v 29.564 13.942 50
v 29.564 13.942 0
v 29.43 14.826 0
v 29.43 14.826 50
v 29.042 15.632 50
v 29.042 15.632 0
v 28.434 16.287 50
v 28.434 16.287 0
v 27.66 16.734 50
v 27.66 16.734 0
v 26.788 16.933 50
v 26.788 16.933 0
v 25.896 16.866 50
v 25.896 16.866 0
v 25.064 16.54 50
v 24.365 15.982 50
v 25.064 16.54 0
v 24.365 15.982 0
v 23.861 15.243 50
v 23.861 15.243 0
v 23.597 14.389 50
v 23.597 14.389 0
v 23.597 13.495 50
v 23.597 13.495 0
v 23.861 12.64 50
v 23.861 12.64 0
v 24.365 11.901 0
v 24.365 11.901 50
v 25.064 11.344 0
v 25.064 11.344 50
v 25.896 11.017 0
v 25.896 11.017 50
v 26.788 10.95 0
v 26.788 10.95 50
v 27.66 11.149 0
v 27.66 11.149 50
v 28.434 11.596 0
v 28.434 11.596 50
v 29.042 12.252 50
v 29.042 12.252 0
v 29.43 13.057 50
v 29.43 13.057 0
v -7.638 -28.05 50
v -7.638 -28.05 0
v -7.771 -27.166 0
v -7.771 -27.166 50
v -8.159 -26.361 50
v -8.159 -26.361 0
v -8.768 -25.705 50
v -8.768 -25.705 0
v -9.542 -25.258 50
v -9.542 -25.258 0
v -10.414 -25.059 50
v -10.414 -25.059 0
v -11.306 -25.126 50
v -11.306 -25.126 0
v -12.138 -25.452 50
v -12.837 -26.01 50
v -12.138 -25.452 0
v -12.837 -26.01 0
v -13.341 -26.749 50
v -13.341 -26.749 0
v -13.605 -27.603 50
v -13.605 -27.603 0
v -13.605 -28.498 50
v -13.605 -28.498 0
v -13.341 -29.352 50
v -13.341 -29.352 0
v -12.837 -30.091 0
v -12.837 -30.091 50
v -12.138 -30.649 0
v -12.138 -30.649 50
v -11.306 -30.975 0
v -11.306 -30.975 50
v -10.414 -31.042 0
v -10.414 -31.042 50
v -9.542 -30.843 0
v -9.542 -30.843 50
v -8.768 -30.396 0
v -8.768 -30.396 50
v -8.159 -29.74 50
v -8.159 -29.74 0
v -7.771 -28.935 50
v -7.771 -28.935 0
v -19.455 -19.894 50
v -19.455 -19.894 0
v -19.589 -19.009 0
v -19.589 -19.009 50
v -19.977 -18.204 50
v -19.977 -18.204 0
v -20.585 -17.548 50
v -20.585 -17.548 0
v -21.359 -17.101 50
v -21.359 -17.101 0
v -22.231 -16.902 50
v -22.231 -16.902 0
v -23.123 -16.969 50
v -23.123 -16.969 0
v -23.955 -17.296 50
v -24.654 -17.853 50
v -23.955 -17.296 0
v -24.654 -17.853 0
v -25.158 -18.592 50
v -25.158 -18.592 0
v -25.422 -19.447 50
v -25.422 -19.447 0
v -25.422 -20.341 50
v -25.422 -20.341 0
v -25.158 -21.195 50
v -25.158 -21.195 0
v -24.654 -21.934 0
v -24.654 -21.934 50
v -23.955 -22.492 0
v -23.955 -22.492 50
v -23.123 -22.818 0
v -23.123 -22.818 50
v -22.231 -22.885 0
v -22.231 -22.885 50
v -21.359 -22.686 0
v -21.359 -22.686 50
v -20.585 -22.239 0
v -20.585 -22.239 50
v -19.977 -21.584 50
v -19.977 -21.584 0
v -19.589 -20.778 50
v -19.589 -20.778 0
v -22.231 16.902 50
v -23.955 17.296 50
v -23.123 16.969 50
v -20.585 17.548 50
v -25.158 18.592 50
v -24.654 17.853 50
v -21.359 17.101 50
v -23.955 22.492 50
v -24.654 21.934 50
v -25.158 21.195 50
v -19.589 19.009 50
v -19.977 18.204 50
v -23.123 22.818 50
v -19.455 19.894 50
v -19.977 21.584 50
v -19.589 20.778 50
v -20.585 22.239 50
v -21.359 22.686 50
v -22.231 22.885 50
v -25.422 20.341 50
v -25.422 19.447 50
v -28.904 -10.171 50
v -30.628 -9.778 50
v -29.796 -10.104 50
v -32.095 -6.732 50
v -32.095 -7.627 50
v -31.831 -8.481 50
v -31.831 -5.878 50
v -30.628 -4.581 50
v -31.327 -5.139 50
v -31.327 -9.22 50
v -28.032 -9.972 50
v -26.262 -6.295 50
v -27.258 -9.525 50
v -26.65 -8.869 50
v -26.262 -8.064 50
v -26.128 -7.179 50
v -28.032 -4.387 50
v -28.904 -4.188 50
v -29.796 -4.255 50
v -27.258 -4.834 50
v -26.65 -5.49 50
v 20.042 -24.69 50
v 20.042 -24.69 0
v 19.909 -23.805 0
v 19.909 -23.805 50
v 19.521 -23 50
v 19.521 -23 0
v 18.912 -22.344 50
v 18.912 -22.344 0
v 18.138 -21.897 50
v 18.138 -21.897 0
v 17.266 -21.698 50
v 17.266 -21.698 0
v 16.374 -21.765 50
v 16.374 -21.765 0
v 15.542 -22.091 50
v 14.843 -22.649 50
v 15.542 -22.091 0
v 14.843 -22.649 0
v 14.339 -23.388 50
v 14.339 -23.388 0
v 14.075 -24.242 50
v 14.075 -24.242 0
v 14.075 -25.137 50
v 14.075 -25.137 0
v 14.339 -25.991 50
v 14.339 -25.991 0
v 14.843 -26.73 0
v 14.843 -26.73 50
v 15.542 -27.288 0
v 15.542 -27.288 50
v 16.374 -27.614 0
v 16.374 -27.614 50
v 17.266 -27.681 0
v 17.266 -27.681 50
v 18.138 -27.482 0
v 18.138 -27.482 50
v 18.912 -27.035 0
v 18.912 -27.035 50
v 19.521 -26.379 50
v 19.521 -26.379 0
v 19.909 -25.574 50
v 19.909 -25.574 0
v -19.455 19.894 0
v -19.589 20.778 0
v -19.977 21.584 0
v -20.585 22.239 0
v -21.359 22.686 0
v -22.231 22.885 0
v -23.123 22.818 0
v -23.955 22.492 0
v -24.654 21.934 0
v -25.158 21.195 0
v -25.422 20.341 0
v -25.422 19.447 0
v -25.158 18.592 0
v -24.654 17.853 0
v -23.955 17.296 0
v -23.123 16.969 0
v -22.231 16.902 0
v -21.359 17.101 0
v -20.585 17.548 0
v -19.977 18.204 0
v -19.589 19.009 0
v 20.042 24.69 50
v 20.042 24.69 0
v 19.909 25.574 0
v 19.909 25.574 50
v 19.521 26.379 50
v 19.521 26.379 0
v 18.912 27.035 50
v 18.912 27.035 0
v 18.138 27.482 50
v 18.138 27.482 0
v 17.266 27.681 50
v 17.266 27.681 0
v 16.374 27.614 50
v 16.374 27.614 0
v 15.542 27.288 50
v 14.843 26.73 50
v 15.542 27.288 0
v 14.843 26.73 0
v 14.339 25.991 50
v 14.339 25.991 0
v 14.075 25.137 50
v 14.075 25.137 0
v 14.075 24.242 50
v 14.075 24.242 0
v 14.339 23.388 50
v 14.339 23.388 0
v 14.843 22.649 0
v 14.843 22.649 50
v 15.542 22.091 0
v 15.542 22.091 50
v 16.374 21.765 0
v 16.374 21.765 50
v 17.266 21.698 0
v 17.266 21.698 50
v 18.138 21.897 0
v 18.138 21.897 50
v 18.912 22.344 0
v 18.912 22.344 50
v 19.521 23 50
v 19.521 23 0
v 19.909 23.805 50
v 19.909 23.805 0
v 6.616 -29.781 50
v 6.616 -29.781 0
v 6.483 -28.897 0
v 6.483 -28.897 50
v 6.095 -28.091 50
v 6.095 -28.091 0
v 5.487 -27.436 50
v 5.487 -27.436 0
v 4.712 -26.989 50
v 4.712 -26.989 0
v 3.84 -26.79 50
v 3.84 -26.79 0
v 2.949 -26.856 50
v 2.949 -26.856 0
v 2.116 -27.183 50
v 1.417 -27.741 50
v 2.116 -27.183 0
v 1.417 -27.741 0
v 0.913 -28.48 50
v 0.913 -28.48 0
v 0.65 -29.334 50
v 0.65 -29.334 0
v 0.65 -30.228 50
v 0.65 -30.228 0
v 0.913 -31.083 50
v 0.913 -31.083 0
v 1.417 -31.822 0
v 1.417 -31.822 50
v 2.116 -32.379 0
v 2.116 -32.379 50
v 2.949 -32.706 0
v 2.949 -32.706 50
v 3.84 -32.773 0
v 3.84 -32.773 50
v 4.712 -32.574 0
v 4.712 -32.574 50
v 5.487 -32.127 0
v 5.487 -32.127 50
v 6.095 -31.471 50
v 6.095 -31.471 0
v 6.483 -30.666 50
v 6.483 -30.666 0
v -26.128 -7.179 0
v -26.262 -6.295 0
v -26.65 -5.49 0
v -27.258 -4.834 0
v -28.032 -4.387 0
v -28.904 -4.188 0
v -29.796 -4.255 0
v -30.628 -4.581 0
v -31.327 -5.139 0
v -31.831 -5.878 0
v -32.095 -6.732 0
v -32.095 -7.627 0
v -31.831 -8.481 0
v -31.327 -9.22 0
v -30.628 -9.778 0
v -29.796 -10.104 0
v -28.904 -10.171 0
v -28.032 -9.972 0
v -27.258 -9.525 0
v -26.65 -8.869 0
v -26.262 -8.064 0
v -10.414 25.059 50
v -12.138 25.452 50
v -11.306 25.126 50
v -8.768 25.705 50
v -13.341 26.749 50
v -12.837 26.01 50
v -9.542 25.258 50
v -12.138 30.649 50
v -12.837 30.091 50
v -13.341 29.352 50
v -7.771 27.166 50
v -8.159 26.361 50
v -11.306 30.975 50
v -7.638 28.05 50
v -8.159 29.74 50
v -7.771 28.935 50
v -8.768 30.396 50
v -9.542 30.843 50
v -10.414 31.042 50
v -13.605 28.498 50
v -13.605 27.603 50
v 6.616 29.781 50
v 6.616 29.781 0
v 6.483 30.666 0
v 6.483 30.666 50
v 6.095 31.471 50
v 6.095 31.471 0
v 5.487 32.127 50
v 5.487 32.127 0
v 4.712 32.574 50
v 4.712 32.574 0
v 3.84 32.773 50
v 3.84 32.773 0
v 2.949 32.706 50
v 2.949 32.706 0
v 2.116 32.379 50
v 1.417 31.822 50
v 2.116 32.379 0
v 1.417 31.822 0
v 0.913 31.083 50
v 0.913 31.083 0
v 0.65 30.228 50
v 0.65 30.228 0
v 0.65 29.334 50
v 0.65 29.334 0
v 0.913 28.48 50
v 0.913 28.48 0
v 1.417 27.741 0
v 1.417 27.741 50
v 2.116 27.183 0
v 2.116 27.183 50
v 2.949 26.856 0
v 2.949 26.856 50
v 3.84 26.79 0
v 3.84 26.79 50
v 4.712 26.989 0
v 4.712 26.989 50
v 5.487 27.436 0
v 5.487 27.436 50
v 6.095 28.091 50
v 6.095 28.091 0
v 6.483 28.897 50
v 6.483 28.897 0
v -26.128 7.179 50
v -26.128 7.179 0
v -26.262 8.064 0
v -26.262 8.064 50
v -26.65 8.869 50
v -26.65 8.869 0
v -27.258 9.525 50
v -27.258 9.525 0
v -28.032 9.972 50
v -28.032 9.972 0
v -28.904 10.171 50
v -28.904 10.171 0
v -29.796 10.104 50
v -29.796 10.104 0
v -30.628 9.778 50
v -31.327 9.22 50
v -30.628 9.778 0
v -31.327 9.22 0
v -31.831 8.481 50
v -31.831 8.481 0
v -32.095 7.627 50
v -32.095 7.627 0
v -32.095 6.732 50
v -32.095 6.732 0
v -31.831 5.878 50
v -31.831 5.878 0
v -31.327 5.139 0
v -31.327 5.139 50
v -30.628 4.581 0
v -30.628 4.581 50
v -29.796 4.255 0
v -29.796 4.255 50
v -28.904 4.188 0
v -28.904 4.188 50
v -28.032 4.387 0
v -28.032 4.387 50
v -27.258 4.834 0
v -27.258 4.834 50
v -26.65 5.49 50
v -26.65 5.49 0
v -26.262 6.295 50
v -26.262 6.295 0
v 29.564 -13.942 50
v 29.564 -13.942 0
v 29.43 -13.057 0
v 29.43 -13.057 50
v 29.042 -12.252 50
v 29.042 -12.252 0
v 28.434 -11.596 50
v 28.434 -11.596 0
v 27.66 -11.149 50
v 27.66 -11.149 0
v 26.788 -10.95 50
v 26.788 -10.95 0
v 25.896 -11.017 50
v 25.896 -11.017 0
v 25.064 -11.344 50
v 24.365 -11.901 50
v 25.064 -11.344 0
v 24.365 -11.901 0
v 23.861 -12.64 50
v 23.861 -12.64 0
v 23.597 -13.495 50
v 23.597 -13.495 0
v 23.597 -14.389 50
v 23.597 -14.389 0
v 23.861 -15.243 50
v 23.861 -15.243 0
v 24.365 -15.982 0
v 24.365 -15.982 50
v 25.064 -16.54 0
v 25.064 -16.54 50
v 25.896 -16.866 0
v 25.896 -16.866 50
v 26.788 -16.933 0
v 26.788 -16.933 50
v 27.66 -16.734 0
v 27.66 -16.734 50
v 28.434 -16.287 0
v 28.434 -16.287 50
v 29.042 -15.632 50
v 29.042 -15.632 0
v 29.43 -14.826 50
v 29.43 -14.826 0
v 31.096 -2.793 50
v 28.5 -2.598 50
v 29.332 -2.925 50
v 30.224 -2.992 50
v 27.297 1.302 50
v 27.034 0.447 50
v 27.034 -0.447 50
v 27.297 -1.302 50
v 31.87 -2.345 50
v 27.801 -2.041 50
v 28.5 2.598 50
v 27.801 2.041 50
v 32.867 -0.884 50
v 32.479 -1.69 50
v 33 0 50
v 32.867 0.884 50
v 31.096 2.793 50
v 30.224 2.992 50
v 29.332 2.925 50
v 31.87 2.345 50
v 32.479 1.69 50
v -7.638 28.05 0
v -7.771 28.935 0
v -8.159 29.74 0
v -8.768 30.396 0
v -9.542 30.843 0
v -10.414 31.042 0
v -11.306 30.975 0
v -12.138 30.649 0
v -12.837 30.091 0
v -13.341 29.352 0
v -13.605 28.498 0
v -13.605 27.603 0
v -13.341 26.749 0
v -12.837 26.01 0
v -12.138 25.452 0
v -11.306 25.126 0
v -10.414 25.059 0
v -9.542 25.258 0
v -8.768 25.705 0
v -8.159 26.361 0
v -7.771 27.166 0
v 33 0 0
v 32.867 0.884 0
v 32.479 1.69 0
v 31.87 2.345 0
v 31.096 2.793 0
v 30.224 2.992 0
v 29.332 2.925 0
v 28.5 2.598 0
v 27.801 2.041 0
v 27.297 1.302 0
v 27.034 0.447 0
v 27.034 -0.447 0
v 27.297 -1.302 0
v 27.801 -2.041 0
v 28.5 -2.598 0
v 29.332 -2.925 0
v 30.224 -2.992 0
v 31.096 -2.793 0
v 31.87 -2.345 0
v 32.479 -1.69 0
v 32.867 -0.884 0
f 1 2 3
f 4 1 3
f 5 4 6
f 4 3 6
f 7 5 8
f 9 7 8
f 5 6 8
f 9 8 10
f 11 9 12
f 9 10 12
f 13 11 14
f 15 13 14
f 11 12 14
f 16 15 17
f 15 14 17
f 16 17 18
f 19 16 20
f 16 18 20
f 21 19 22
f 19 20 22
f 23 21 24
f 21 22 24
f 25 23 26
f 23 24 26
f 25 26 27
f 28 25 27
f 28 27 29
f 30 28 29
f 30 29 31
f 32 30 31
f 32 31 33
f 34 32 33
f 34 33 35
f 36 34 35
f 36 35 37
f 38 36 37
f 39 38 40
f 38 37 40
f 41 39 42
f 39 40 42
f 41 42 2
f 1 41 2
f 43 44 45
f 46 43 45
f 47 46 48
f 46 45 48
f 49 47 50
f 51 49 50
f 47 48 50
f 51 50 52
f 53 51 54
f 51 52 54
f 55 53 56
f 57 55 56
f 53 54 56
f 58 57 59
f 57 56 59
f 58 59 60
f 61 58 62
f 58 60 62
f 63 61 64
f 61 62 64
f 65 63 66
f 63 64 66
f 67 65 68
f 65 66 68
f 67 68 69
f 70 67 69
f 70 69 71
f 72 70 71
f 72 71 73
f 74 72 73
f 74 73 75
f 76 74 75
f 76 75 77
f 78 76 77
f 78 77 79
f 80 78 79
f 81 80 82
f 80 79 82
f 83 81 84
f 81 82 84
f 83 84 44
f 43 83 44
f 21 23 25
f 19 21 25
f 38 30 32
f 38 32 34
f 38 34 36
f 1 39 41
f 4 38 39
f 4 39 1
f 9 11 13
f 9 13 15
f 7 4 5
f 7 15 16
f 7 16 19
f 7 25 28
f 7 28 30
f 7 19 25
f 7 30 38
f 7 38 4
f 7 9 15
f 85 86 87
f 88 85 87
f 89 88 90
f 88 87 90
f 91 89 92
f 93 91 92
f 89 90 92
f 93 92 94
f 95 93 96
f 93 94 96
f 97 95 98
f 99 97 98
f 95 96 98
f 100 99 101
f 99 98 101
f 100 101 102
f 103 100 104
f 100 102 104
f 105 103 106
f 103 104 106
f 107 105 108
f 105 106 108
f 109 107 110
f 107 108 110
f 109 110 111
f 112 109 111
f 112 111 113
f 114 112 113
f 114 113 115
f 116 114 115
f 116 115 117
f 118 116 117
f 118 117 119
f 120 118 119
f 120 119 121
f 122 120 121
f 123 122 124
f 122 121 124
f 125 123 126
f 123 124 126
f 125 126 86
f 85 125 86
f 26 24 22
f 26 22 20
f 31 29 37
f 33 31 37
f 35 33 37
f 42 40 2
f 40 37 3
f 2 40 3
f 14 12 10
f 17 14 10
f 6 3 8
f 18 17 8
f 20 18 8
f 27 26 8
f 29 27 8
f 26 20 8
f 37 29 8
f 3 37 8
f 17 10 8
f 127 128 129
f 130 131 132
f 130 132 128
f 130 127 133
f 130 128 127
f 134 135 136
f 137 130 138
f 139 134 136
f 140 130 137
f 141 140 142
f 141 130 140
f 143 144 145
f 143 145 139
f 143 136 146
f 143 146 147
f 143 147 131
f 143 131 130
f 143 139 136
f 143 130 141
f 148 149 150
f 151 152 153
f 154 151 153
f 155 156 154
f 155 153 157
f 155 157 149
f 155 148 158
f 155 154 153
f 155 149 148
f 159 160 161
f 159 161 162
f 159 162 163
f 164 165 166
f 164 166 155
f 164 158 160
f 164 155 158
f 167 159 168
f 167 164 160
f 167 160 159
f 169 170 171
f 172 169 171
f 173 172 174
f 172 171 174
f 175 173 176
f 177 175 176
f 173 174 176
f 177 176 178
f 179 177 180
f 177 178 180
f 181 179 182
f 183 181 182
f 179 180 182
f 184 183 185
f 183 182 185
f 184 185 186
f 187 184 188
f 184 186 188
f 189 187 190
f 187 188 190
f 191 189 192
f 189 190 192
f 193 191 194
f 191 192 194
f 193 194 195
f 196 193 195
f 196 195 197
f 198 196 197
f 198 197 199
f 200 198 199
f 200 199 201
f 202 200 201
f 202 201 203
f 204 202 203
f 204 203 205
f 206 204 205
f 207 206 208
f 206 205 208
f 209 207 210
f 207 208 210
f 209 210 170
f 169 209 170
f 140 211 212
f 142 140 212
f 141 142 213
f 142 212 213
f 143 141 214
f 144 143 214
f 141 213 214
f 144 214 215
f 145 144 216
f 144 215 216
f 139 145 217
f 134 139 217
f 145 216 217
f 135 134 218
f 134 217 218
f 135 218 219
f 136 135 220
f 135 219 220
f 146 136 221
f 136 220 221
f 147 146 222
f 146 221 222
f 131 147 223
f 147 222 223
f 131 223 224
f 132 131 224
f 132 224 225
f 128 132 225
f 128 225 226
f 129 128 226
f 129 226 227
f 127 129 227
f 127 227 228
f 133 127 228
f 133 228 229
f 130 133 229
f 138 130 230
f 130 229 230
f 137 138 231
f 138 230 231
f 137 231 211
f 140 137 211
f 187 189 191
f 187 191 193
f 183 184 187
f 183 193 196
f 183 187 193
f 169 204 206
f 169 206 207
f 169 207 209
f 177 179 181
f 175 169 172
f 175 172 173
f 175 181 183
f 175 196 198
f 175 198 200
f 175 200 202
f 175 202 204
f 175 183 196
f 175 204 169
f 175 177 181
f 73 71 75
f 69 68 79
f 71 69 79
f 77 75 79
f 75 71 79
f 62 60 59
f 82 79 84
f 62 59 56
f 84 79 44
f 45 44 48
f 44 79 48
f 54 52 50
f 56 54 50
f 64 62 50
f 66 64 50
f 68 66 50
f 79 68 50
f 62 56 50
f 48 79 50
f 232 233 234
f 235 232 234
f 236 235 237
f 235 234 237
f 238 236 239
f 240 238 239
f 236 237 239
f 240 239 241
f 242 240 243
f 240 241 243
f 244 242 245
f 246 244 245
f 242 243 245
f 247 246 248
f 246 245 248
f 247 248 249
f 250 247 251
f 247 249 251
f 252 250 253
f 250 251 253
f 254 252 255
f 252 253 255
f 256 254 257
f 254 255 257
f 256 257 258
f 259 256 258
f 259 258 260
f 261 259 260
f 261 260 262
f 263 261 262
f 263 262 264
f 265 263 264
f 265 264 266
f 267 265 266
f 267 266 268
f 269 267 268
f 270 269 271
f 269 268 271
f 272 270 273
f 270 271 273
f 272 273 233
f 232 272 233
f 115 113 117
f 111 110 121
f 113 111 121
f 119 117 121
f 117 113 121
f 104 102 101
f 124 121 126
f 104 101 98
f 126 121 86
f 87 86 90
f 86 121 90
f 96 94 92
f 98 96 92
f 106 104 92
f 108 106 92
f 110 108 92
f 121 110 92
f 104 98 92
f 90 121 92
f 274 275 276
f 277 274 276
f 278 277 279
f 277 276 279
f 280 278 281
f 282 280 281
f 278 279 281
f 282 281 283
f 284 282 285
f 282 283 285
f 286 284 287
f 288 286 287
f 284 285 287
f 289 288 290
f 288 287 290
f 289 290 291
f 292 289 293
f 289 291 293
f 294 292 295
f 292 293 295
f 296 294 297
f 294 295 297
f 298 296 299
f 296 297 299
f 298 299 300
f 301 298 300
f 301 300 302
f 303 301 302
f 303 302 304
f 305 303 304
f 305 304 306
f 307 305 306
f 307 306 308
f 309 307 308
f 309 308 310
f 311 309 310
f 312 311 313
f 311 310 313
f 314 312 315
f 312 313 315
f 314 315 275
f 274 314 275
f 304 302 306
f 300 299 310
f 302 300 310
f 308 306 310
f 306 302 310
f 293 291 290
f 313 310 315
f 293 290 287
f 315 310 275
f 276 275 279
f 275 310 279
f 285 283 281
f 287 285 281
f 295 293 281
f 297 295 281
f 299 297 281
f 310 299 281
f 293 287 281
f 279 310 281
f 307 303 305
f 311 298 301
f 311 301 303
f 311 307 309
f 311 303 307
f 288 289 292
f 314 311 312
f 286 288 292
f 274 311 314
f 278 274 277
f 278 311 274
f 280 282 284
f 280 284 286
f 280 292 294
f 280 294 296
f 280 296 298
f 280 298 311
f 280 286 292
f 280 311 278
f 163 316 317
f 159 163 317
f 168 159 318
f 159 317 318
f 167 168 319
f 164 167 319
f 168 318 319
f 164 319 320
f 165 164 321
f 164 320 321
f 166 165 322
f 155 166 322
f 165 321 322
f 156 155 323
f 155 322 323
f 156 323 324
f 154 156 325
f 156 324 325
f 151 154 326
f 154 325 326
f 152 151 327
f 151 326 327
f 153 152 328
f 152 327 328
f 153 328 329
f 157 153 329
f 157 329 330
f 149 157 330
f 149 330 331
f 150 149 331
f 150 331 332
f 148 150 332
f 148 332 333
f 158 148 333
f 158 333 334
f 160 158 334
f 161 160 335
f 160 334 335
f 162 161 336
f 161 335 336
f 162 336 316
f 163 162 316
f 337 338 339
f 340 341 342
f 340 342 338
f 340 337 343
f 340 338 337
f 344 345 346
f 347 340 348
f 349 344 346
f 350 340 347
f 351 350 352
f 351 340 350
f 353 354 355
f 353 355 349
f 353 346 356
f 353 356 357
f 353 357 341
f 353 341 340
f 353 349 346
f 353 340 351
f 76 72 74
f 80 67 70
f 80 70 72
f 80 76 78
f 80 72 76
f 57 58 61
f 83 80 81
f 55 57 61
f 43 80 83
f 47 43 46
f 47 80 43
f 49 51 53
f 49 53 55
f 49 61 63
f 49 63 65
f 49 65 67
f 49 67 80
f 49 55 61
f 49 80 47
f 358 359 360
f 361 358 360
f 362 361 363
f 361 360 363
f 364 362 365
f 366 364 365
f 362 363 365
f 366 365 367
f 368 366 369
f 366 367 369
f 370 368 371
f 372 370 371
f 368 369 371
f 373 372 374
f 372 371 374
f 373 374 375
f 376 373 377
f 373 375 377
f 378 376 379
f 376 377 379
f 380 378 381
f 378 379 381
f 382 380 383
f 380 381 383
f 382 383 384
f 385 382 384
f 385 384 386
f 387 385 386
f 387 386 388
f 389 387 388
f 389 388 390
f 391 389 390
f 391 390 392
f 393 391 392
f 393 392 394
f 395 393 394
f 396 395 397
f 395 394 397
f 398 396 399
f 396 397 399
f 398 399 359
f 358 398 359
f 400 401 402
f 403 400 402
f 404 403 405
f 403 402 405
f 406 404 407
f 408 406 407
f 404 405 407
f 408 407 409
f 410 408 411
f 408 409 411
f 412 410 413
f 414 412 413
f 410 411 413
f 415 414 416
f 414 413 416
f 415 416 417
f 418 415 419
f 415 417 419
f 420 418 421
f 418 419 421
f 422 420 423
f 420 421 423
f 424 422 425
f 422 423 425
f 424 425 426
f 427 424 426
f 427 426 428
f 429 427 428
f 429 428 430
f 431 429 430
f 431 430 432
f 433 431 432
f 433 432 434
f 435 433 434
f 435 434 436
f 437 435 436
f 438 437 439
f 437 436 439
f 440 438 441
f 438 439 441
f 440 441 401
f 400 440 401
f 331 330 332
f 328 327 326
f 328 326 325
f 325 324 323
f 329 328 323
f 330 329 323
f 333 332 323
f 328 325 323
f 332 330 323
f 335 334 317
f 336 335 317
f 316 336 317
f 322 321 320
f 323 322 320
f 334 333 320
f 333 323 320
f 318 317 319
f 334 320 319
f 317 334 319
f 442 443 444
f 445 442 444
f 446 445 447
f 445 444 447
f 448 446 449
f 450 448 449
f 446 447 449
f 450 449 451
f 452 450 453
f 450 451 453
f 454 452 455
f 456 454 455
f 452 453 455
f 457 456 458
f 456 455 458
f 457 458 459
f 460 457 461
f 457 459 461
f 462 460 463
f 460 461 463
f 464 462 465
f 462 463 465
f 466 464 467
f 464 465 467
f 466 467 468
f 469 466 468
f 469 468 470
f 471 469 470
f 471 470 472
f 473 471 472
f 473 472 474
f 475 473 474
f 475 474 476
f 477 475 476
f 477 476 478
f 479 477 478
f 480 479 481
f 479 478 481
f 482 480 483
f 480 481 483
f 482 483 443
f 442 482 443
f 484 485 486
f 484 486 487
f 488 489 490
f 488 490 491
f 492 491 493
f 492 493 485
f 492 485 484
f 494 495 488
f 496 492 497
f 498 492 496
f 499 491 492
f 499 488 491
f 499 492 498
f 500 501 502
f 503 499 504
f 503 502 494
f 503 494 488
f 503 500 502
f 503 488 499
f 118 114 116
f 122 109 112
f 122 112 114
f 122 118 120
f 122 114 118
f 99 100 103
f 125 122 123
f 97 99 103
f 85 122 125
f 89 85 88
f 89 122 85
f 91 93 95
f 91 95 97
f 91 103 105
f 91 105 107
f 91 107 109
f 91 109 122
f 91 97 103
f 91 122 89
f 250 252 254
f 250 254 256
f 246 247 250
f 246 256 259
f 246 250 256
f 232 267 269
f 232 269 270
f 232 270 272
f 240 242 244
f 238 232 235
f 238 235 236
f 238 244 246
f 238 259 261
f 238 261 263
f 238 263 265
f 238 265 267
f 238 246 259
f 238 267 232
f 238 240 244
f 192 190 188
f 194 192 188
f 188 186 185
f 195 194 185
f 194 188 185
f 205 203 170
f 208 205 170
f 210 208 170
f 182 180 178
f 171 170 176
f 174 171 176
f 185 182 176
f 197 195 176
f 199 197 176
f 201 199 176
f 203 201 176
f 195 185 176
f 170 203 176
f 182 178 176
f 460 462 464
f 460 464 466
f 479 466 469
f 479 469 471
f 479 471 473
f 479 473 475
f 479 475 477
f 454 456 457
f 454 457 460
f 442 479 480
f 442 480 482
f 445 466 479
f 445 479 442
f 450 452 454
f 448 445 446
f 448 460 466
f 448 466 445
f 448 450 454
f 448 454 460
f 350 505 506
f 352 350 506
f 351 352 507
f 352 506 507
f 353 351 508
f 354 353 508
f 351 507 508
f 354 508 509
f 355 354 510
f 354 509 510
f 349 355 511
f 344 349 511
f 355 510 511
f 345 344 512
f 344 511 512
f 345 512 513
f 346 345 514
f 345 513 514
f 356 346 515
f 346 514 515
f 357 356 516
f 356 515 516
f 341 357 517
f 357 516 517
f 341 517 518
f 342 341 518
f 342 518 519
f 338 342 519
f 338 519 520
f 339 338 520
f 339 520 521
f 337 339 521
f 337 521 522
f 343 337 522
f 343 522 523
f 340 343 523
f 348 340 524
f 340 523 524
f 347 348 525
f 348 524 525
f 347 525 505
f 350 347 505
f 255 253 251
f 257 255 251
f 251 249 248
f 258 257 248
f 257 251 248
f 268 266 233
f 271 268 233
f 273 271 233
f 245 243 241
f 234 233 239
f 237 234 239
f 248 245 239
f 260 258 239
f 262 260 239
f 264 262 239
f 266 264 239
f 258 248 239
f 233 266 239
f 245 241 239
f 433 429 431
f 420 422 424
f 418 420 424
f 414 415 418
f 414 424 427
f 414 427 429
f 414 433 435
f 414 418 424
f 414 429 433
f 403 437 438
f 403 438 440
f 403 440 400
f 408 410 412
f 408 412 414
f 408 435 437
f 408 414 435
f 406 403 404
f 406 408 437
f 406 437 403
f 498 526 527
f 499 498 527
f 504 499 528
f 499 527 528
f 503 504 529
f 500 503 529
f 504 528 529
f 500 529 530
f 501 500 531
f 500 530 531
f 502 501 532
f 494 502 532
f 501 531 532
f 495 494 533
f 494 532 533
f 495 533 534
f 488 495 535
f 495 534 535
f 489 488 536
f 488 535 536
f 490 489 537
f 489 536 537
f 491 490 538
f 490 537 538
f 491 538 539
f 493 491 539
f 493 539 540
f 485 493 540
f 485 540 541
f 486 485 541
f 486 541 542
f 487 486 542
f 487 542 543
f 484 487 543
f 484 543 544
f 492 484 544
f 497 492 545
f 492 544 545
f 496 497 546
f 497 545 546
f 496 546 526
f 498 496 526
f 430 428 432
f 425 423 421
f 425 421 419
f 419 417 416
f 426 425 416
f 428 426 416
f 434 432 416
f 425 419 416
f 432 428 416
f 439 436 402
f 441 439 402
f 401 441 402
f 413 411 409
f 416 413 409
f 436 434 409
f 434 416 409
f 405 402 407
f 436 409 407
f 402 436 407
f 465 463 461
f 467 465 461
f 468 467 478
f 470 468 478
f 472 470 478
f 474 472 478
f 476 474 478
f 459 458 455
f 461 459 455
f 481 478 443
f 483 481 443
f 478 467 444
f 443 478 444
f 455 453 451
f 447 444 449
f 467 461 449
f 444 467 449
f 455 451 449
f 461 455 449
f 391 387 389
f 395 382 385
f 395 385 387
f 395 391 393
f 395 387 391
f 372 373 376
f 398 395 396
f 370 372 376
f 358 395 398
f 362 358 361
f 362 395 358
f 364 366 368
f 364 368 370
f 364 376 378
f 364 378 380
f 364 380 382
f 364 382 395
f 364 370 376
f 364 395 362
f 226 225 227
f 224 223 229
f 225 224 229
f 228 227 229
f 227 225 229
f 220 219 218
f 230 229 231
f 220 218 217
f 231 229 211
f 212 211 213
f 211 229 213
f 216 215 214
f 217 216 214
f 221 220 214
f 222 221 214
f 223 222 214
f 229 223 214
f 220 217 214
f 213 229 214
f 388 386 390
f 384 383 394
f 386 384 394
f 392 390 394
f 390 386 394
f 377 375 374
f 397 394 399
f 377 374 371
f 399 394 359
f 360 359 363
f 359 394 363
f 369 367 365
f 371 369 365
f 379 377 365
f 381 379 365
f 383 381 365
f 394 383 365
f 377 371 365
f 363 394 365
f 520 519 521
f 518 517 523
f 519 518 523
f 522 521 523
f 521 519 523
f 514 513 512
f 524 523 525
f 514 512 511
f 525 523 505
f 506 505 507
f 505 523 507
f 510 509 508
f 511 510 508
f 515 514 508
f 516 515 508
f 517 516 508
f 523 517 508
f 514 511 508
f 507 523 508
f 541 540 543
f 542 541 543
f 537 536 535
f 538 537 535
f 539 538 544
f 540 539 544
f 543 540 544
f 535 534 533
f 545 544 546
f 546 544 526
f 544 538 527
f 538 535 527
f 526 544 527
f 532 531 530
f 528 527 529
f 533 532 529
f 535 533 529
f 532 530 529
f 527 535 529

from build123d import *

# Parameters (mm, degrees)
SKETCH1_R              = 3
BOSS_EXTRUDE1_DEPTH    = 50
BOSS_EXTRUDE1_2_DEPTH  = 50
BOSS_EXTRUDE1_3_DEPTH  = 50
BOSS_EXTRUDE1_4_DEPTH  = 50
BOSS_EXTRUDE1_5_DEPTH  = 50
BOSS_EXTRUDE1_6_DEPTH  = 50
BOSS_EXTRUDE1_7_DEPTH  = 50
BOSS_EXTRUDE1_8_DEPTH  = 50
BOSS_EXTRUDE1_9_DEPTH  = 50
BOSS_EXTRUDE1_10_DEPTH = 50
BOSS_EXTRUDE1_11_DEPTH = 50
BOSS_EXTRUDE1_12_DEPTH = 50
BOSS_EXTRUDE1_13_DEPTH = 50


with BuildPart() as part:
    # Sketch1 → Boss-Extrude1 (new body)
    with BuildSketch(Plane.XY):
        with Locations((30, 0)):
            Circle(SKETCH1_R)
    extrude(amount=BOSS_EXTRUDE1_DEPTH)


with BuildPart() as body_2:
    # Sketch1 → Boss-Extrude1 2 (new body)
    with BuildSketch(Plane.XY):
        with Locations((26.56368077, -13.941695161)):
            Circle(SKETCH1_R)
    extrude(amount=BOSS_EXTRUDE1_2_DEPTH)


with BuildPart() as body_3:
    # Sketch1 → Boss-Extrude1 3 (new body)
    with BuildSketch(Plane.XY):
        with Locations((17.041942402, -24.689515977)):
            Circle(SKETCH1_R)
    extrude(amount=BOSS_EXTRUDE1_3_DEPTH)


with BuildPart() as body_4:
    # Sketch1 → Boss-Extrude1 4 (new body)
    with BuildSketch(Plane.XY):
        with Locations((3.616100408, -29.781266223)):
            Circle(SKETCH1_R)
    extrude(amount=BOSS_EXTRUDE1_4_DEPTH)


with BuildPart() as body_5:
    # Sketch1 → Boss-Extrude1 5 (new body)
    with BuildSketch(Plane.XY):
        with Locations((-10.638146611, -28.050487281)):
            Circle(SKETCH1_R)
    extrude(amount=BOSS_EXTRUDE1_5_DEPTH)


with BuildPart() as body_6:
    # Sketch1 → Boss-Extrude1 6 (new body)
    with BuildSketch(Plane.XY):
        with Locations((-22.455322445, -19.893679747)):
            Circle(SKETCH1_R)
    extrude(amount=BOSS_EXTRUDE1_6_DEPTH)


with BuildPart() as body_7:
    # Sketch1 → Boss-Extrude1 7 (new body)
    with BuildSketch(Plane.XY):
        with Locations((-29.128254523, -7.179469929)):
            Circle(SKETCH1_R)
    extrude(amount=BOSS_EXTRUDE1_7_DEPTH)


with BuildPart() as body_8:
    # Sketch1 → Boss-Extrude1 8 (new body)
    with BuildSketch(Plane.XY):
        with Locations((-29.128254523, 7.179469929)):
            Circle(SKETCH1_R)
    extrude(amount=BOSS_EXTRUDE1_8_DEPTH)


with BuildPart() as body_9:
    # Sketch1 → Boss-Extrude1 9 (new body)
    with BuildSketch(Plane.XY):
        with Locations((-22.455322445, 19.893679747)):
            Circle(SKETCH1_R)
    extrude(amount=BOSS_EXTRUDE1_9_DEPTH)


with BuildPart() as body_10:
    # Sketch1 → Boss-Extrude1 10 (new body)
    with BuildSketch(Plane.XY):
        with Locations((-10.638146611, 28.050487281)):
            Circle(SKETCH1_R)
    extrude(amount=BOSS_EXTRUDE1_10_DEPTH)


with BuildPart() as body_11:
    # Sketch1 → Boss-Extrude1 11 (new body)
    with BuildSketch(Plane.XY):
        with Locations((3.616100408, 29.781266223)):
            Circle(SKETCH1_R)
    extrude(amount=BOSS_EXTRUDE1_11_DEPTH)


with BuildPart() as body_12:
    # Sketch1 → Boss-Extrude1 12 (new body)
    with BuildSketch(Plane.XY):
        with Locations((17.041942402, 24.689515977)):
            Circle(SKETCH1_R)
    extrude(amount=BOSS_EXTRUDE1_12_DEPTH)


with BuildPart() as body_13:
    # Sketch1 → Boss-Extrude1 13 (new body)
    with BuildSketch(Plane.XY):
        with Locations((26.56368077, 13.941695161)):
            Circle(SKETCH1_R)
    extrude(amount=BOSS_EXTRUDE1_13_DEPTH)


solid = Compound([part.part, body_2.part, body_3.part, body_4.part, body_5.part, body_6.part, body_7.part, body_8.part, body_9.part, body_10.part, body_11.part, body_12.part, body_13.part])
